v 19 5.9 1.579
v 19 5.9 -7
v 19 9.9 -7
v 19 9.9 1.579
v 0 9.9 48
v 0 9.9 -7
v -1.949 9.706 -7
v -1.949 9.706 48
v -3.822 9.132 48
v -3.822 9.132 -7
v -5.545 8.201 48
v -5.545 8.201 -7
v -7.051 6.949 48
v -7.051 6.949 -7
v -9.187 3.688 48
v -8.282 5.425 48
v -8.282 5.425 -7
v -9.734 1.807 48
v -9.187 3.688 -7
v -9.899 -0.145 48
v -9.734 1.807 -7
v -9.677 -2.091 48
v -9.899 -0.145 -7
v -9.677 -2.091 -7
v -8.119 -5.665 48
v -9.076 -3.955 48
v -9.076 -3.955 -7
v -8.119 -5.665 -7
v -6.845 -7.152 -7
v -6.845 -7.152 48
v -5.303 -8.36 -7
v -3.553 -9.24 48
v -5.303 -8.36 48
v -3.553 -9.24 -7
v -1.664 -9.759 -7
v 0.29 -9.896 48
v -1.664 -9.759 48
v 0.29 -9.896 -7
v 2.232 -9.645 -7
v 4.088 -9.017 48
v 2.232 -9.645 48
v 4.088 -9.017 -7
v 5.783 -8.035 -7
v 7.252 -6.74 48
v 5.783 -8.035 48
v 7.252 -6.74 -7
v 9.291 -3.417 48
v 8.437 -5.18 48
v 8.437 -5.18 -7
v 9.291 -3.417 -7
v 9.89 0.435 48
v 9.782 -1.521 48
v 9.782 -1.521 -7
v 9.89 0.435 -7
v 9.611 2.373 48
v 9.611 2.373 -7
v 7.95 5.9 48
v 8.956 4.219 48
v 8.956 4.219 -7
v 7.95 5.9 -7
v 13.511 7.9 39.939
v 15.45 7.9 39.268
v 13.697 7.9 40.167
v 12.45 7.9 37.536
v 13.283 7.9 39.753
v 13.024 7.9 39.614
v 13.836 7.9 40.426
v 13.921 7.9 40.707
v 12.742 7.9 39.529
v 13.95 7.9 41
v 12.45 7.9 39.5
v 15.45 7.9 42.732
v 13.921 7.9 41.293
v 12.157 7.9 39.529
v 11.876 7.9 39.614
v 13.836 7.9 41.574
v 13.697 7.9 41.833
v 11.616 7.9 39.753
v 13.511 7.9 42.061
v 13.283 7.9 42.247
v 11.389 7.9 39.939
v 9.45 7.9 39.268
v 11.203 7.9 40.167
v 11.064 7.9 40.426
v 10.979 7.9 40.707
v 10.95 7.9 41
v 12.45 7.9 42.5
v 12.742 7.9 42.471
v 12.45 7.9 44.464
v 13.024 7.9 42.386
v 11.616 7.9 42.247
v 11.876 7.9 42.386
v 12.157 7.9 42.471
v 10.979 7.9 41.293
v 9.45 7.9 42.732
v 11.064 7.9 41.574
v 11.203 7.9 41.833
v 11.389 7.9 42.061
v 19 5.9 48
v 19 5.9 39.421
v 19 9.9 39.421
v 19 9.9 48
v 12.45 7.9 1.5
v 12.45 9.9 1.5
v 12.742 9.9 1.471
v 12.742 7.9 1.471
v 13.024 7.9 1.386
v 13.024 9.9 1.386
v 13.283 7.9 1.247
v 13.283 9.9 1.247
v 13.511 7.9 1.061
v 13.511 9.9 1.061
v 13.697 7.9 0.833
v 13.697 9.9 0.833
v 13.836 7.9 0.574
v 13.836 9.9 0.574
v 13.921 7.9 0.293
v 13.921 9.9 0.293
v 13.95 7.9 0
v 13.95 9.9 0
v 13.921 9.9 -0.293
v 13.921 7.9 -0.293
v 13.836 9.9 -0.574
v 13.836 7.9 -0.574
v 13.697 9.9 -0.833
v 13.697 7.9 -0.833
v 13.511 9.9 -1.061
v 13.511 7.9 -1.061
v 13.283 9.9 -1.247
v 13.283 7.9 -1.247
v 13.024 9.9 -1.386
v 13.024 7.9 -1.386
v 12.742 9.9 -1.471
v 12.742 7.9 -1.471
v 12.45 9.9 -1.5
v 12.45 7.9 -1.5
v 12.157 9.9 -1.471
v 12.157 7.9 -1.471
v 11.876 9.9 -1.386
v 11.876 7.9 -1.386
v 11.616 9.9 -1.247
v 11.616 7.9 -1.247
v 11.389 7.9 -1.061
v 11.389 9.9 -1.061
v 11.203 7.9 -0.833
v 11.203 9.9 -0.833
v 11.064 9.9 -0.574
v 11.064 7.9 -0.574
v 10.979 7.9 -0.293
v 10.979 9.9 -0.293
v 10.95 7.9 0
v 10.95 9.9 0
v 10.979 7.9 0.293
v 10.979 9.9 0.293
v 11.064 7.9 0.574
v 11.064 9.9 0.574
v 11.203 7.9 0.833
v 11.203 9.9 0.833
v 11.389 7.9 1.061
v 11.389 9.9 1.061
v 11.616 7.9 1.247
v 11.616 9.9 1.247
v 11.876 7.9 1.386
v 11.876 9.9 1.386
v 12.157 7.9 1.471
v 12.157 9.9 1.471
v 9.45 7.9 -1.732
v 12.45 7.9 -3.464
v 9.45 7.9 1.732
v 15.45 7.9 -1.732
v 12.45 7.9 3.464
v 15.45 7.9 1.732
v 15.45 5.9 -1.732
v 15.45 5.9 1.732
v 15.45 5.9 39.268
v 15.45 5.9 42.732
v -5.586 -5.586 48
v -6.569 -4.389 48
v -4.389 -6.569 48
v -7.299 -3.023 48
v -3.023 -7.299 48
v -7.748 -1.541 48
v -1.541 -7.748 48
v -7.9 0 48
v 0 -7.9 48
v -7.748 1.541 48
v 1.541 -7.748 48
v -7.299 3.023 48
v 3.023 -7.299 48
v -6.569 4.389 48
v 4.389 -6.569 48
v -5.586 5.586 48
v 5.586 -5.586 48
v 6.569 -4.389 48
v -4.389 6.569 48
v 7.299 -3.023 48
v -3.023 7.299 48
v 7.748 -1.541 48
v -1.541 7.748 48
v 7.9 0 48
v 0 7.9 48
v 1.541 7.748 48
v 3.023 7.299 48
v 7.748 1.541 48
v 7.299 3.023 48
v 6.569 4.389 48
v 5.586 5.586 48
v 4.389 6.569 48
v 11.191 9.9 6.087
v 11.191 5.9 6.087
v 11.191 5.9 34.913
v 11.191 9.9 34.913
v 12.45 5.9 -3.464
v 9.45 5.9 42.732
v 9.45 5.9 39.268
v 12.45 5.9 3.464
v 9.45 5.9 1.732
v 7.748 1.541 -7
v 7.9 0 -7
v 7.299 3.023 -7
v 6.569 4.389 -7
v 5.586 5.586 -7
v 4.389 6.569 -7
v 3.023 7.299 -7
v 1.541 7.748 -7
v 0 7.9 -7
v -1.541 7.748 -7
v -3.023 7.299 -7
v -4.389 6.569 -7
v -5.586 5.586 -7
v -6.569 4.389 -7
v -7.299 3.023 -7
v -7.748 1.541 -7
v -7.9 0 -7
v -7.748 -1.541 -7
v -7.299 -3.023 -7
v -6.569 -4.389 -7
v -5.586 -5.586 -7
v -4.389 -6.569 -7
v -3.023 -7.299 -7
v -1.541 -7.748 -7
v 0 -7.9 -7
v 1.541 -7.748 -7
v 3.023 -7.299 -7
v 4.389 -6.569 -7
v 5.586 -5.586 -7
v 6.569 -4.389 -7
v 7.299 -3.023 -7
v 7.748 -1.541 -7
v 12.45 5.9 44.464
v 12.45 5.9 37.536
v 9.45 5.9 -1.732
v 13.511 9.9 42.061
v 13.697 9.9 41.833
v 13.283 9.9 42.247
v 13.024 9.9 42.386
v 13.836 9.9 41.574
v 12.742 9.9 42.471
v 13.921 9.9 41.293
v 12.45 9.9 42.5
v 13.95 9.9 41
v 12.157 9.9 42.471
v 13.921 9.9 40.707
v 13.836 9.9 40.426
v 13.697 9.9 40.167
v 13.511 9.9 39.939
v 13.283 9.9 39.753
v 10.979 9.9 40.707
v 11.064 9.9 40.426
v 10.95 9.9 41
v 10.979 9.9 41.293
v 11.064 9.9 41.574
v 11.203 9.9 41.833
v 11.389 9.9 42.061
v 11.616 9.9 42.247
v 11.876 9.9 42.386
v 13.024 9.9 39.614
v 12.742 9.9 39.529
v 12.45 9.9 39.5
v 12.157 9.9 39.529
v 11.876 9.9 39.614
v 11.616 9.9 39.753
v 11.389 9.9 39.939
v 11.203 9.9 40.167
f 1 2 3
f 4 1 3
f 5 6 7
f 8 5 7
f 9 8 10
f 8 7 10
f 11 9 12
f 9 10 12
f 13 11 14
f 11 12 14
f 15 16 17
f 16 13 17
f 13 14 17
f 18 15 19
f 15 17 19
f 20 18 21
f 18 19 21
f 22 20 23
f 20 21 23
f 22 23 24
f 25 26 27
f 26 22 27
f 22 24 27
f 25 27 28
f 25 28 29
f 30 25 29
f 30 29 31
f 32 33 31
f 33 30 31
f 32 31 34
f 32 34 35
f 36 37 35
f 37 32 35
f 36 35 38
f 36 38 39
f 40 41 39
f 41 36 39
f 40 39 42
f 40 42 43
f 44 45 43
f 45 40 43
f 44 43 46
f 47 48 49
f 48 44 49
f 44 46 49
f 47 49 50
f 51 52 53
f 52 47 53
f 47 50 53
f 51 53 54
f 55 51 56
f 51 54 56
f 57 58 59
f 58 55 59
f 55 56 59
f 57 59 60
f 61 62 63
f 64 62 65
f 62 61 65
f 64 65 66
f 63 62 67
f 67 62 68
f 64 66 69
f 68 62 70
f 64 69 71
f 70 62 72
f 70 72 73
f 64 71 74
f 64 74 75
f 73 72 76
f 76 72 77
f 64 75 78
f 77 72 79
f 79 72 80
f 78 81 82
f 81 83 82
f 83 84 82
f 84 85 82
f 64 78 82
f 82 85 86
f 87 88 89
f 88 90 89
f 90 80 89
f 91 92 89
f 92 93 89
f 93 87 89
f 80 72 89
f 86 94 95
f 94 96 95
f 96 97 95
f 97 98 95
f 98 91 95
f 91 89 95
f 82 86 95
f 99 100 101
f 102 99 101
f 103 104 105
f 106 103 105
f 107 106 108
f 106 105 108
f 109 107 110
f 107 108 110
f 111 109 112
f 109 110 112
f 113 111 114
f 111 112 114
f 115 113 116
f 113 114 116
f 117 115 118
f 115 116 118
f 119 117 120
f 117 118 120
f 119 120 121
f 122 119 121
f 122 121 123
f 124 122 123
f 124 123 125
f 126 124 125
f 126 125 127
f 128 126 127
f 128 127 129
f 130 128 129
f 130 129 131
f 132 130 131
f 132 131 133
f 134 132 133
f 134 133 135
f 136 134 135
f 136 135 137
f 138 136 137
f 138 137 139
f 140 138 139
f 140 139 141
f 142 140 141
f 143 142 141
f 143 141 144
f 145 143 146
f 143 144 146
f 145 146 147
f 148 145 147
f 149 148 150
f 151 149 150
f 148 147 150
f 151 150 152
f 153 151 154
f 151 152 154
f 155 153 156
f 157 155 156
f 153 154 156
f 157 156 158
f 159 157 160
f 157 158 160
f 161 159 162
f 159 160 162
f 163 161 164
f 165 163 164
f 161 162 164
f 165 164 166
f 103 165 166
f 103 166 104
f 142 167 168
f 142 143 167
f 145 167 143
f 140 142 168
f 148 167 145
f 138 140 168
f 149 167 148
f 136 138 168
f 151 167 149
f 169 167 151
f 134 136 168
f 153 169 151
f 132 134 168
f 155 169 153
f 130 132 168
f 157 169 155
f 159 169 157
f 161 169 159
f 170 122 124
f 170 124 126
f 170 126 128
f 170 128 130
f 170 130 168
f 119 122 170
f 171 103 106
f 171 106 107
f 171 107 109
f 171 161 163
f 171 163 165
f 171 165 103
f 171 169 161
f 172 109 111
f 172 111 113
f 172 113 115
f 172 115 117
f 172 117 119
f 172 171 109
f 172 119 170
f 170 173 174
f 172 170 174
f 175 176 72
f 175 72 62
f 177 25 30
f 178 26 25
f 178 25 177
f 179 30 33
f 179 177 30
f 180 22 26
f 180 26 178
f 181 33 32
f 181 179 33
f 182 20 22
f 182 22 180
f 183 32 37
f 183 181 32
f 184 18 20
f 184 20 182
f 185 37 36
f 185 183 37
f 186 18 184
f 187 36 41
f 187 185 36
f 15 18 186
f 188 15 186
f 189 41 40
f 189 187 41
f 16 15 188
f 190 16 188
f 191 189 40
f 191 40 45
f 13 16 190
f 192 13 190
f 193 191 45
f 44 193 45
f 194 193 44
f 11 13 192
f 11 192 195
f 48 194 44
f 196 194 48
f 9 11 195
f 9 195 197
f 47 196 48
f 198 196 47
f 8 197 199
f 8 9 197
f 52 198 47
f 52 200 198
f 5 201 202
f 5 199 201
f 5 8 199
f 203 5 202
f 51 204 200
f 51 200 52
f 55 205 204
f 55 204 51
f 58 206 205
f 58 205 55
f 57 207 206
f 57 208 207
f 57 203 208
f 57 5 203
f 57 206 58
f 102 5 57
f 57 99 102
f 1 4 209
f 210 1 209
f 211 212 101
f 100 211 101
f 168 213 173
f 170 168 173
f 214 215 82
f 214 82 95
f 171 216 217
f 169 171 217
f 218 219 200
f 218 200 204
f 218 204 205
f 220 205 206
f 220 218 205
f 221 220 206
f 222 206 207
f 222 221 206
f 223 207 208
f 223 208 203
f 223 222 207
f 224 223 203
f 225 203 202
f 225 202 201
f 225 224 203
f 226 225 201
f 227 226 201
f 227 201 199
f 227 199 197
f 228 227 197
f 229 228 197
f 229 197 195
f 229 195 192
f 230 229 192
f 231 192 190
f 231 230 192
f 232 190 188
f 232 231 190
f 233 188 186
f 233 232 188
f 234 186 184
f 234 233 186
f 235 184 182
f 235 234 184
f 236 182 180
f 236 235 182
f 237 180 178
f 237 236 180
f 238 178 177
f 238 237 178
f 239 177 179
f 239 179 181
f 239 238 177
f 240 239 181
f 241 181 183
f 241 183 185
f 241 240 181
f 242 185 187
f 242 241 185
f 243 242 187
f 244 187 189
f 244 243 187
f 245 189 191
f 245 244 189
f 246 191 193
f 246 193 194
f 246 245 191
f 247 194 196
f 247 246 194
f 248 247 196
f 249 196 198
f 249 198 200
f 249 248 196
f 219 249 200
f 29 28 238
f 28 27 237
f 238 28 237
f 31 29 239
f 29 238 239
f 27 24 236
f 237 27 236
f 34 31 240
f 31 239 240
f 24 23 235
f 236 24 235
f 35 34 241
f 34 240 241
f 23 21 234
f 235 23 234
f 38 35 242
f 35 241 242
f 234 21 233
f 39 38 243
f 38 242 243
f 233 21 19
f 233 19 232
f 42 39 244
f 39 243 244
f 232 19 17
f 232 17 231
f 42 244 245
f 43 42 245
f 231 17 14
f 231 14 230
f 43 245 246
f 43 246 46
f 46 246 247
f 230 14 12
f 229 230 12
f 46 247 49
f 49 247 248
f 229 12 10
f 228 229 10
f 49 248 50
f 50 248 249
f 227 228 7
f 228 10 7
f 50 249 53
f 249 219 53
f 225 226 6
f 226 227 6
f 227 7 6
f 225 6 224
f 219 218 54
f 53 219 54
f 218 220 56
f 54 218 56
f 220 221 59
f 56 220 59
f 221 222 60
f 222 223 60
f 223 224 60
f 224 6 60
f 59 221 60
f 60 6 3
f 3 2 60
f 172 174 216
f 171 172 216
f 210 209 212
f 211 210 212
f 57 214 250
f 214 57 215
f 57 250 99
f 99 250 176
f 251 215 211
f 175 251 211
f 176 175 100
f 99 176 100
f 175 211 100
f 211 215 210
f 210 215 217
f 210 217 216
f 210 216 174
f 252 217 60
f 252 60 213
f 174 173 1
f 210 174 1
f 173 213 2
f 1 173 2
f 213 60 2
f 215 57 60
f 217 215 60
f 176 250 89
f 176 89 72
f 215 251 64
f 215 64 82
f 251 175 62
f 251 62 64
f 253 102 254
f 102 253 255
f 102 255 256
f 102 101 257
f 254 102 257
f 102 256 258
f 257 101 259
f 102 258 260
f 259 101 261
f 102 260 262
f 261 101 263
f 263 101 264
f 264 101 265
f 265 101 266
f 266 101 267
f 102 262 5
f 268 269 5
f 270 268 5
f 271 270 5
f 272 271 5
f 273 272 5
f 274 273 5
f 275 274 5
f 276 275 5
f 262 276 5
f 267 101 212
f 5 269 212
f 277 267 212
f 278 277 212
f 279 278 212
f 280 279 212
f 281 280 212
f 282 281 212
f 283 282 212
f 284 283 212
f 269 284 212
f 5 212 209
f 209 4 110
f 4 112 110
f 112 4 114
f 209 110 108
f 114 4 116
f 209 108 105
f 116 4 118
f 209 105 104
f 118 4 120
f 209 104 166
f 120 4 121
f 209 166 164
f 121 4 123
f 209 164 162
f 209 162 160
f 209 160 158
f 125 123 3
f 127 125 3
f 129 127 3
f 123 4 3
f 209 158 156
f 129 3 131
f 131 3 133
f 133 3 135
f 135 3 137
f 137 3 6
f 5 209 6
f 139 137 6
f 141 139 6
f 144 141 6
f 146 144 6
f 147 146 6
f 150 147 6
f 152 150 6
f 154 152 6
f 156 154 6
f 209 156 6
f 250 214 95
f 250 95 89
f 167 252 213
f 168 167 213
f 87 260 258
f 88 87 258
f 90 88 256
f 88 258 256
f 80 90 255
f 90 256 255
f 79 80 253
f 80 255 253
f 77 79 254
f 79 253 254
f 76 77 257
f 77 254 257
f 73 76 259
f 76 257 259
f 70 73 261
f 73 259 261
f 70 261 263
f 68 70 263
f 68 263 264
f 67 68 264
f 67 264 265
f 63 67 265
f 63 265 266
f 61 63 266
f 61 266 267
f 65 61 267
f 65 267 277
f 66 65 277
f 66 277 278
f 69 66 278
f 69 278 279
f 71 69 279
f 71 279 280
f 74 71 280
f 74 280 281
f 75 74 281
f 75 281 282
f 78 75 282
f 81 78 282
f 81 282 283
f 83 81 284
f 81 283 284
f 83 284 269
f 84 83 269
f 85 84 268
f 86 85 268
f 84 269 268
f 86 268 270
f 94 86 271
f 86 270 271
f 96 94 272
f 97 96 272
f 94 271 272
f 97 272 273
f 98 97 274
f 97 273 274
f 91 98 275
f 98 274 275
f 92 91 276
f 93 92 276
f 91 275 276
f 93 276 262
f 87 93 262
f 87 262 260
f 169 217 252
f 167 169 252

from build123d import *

# Parameters (mm, degrees)
EXTRUDE_1_DEPTH      = 48
EXTRUDE_1_DEPTH_BACK = 7
SKETCH_2_R           = 9.9
SKETCH_2_R_2         = 7.9
CUT_EXTRUDE_1_DEPTH  = 2
SKETCH_4_R           = 1.5
CUT_EXTRUDE_2_DEPTH  = 10
CUT_EXTRUDE_3_DEPTH  = 10


with BuildPart() as part:
    # Эскиз2 → Бобышка-Вытянуть1 (new, two sides: drawn at the far end of the back side and taken through both)
    # profile 1 of 2: a face of its own
    with BuildSketch(Plane.XY.offset(-EXTRUDE_1_DEPTH_BACK)):
        Circle(SKETCH_2_R)
        Circle(SKETCH_2_R_2, mode=Mode.SUBTRACT)
    # profile 2 of 2: a face of its own
    with BuildSketch(Plane.XY.offset(-EXTRUDE_1_DEPTH_BACK)):
        with BuildLine():
            Line((19, 9.9), (0, 9.9))
            ThreePointArc((0, 9.9), (4.449719092, 8.843641784), (7.949842766, 5.9))
            Line((7.949842766, 5.9), (19, 5.9))
            Line((19, 5.9), (19, 9.9))
        make_face()
    extrude(amount=EXTRUDE_1_DEPTH + EXTRUDE_1_DEPTH_BACK)

    # Эскиз3 → Вырез-Вытянуть1 (cut)
    with BuildSketch(Plane.XZ.offset(-5.9)):
        Polygon((15.449842766, -1.732050808), (15.449842766, 1.732050808), (12.449842766, 3.464101615), (9.449842766, 1.732050808), (9.449842766, -1.732050808), (12.449842766, -3.464101615), align=None)
        Polygon((12.449842766, 44.464101615), (15.449842766, 42.732050808), (15.449842766, 39.267949192), (12.449842766, 37.535898385), (9.449842766, 39.267949192), (9.449842766, 42.732050808), align=None)
    extrude(amount=-CUT_EXTRUDE_1_DEPTH, mode=Mode.SUBTRACT)

    # Эскиз4 → Вырез-Вытянуть2 (cut)
    with BuildSketch(Plane(origin=(0, 9.9, 0), x_dir=(1, 0, 0), z_dir=(0, 1, 0))):
        with Locations(Location((12.449842766, 0, 0), (0, 0, 270))):
            Circle(SKETCH_4_R)
        with Locations(Location((12.449842766, -41, 0), (0, 0, 270))):
            Circle(SKETCH_4_R)
    extrude(amount=-CUT_EXTRUDE_2_DEPTH, mode=Mode.SUBTRACT)

    # Эскиз5 → Вырез-Вытянуть3 (cut)
    with BuildSketch(Plane(origin=(0, 9.9, 0), x_dir=(1, 0, 0), z_dir=(0, 1, 0))):
        Polygon((19, -1.578851944), (11.190820694, -6.087483718), (11.190820694, -34.912516282), (19, -39.421148056), align=None)
    extrude(amount=-CUT_EXTRUDE_3_DEPTH, mode=Mode.SUBTRACT)


solid = part.part
